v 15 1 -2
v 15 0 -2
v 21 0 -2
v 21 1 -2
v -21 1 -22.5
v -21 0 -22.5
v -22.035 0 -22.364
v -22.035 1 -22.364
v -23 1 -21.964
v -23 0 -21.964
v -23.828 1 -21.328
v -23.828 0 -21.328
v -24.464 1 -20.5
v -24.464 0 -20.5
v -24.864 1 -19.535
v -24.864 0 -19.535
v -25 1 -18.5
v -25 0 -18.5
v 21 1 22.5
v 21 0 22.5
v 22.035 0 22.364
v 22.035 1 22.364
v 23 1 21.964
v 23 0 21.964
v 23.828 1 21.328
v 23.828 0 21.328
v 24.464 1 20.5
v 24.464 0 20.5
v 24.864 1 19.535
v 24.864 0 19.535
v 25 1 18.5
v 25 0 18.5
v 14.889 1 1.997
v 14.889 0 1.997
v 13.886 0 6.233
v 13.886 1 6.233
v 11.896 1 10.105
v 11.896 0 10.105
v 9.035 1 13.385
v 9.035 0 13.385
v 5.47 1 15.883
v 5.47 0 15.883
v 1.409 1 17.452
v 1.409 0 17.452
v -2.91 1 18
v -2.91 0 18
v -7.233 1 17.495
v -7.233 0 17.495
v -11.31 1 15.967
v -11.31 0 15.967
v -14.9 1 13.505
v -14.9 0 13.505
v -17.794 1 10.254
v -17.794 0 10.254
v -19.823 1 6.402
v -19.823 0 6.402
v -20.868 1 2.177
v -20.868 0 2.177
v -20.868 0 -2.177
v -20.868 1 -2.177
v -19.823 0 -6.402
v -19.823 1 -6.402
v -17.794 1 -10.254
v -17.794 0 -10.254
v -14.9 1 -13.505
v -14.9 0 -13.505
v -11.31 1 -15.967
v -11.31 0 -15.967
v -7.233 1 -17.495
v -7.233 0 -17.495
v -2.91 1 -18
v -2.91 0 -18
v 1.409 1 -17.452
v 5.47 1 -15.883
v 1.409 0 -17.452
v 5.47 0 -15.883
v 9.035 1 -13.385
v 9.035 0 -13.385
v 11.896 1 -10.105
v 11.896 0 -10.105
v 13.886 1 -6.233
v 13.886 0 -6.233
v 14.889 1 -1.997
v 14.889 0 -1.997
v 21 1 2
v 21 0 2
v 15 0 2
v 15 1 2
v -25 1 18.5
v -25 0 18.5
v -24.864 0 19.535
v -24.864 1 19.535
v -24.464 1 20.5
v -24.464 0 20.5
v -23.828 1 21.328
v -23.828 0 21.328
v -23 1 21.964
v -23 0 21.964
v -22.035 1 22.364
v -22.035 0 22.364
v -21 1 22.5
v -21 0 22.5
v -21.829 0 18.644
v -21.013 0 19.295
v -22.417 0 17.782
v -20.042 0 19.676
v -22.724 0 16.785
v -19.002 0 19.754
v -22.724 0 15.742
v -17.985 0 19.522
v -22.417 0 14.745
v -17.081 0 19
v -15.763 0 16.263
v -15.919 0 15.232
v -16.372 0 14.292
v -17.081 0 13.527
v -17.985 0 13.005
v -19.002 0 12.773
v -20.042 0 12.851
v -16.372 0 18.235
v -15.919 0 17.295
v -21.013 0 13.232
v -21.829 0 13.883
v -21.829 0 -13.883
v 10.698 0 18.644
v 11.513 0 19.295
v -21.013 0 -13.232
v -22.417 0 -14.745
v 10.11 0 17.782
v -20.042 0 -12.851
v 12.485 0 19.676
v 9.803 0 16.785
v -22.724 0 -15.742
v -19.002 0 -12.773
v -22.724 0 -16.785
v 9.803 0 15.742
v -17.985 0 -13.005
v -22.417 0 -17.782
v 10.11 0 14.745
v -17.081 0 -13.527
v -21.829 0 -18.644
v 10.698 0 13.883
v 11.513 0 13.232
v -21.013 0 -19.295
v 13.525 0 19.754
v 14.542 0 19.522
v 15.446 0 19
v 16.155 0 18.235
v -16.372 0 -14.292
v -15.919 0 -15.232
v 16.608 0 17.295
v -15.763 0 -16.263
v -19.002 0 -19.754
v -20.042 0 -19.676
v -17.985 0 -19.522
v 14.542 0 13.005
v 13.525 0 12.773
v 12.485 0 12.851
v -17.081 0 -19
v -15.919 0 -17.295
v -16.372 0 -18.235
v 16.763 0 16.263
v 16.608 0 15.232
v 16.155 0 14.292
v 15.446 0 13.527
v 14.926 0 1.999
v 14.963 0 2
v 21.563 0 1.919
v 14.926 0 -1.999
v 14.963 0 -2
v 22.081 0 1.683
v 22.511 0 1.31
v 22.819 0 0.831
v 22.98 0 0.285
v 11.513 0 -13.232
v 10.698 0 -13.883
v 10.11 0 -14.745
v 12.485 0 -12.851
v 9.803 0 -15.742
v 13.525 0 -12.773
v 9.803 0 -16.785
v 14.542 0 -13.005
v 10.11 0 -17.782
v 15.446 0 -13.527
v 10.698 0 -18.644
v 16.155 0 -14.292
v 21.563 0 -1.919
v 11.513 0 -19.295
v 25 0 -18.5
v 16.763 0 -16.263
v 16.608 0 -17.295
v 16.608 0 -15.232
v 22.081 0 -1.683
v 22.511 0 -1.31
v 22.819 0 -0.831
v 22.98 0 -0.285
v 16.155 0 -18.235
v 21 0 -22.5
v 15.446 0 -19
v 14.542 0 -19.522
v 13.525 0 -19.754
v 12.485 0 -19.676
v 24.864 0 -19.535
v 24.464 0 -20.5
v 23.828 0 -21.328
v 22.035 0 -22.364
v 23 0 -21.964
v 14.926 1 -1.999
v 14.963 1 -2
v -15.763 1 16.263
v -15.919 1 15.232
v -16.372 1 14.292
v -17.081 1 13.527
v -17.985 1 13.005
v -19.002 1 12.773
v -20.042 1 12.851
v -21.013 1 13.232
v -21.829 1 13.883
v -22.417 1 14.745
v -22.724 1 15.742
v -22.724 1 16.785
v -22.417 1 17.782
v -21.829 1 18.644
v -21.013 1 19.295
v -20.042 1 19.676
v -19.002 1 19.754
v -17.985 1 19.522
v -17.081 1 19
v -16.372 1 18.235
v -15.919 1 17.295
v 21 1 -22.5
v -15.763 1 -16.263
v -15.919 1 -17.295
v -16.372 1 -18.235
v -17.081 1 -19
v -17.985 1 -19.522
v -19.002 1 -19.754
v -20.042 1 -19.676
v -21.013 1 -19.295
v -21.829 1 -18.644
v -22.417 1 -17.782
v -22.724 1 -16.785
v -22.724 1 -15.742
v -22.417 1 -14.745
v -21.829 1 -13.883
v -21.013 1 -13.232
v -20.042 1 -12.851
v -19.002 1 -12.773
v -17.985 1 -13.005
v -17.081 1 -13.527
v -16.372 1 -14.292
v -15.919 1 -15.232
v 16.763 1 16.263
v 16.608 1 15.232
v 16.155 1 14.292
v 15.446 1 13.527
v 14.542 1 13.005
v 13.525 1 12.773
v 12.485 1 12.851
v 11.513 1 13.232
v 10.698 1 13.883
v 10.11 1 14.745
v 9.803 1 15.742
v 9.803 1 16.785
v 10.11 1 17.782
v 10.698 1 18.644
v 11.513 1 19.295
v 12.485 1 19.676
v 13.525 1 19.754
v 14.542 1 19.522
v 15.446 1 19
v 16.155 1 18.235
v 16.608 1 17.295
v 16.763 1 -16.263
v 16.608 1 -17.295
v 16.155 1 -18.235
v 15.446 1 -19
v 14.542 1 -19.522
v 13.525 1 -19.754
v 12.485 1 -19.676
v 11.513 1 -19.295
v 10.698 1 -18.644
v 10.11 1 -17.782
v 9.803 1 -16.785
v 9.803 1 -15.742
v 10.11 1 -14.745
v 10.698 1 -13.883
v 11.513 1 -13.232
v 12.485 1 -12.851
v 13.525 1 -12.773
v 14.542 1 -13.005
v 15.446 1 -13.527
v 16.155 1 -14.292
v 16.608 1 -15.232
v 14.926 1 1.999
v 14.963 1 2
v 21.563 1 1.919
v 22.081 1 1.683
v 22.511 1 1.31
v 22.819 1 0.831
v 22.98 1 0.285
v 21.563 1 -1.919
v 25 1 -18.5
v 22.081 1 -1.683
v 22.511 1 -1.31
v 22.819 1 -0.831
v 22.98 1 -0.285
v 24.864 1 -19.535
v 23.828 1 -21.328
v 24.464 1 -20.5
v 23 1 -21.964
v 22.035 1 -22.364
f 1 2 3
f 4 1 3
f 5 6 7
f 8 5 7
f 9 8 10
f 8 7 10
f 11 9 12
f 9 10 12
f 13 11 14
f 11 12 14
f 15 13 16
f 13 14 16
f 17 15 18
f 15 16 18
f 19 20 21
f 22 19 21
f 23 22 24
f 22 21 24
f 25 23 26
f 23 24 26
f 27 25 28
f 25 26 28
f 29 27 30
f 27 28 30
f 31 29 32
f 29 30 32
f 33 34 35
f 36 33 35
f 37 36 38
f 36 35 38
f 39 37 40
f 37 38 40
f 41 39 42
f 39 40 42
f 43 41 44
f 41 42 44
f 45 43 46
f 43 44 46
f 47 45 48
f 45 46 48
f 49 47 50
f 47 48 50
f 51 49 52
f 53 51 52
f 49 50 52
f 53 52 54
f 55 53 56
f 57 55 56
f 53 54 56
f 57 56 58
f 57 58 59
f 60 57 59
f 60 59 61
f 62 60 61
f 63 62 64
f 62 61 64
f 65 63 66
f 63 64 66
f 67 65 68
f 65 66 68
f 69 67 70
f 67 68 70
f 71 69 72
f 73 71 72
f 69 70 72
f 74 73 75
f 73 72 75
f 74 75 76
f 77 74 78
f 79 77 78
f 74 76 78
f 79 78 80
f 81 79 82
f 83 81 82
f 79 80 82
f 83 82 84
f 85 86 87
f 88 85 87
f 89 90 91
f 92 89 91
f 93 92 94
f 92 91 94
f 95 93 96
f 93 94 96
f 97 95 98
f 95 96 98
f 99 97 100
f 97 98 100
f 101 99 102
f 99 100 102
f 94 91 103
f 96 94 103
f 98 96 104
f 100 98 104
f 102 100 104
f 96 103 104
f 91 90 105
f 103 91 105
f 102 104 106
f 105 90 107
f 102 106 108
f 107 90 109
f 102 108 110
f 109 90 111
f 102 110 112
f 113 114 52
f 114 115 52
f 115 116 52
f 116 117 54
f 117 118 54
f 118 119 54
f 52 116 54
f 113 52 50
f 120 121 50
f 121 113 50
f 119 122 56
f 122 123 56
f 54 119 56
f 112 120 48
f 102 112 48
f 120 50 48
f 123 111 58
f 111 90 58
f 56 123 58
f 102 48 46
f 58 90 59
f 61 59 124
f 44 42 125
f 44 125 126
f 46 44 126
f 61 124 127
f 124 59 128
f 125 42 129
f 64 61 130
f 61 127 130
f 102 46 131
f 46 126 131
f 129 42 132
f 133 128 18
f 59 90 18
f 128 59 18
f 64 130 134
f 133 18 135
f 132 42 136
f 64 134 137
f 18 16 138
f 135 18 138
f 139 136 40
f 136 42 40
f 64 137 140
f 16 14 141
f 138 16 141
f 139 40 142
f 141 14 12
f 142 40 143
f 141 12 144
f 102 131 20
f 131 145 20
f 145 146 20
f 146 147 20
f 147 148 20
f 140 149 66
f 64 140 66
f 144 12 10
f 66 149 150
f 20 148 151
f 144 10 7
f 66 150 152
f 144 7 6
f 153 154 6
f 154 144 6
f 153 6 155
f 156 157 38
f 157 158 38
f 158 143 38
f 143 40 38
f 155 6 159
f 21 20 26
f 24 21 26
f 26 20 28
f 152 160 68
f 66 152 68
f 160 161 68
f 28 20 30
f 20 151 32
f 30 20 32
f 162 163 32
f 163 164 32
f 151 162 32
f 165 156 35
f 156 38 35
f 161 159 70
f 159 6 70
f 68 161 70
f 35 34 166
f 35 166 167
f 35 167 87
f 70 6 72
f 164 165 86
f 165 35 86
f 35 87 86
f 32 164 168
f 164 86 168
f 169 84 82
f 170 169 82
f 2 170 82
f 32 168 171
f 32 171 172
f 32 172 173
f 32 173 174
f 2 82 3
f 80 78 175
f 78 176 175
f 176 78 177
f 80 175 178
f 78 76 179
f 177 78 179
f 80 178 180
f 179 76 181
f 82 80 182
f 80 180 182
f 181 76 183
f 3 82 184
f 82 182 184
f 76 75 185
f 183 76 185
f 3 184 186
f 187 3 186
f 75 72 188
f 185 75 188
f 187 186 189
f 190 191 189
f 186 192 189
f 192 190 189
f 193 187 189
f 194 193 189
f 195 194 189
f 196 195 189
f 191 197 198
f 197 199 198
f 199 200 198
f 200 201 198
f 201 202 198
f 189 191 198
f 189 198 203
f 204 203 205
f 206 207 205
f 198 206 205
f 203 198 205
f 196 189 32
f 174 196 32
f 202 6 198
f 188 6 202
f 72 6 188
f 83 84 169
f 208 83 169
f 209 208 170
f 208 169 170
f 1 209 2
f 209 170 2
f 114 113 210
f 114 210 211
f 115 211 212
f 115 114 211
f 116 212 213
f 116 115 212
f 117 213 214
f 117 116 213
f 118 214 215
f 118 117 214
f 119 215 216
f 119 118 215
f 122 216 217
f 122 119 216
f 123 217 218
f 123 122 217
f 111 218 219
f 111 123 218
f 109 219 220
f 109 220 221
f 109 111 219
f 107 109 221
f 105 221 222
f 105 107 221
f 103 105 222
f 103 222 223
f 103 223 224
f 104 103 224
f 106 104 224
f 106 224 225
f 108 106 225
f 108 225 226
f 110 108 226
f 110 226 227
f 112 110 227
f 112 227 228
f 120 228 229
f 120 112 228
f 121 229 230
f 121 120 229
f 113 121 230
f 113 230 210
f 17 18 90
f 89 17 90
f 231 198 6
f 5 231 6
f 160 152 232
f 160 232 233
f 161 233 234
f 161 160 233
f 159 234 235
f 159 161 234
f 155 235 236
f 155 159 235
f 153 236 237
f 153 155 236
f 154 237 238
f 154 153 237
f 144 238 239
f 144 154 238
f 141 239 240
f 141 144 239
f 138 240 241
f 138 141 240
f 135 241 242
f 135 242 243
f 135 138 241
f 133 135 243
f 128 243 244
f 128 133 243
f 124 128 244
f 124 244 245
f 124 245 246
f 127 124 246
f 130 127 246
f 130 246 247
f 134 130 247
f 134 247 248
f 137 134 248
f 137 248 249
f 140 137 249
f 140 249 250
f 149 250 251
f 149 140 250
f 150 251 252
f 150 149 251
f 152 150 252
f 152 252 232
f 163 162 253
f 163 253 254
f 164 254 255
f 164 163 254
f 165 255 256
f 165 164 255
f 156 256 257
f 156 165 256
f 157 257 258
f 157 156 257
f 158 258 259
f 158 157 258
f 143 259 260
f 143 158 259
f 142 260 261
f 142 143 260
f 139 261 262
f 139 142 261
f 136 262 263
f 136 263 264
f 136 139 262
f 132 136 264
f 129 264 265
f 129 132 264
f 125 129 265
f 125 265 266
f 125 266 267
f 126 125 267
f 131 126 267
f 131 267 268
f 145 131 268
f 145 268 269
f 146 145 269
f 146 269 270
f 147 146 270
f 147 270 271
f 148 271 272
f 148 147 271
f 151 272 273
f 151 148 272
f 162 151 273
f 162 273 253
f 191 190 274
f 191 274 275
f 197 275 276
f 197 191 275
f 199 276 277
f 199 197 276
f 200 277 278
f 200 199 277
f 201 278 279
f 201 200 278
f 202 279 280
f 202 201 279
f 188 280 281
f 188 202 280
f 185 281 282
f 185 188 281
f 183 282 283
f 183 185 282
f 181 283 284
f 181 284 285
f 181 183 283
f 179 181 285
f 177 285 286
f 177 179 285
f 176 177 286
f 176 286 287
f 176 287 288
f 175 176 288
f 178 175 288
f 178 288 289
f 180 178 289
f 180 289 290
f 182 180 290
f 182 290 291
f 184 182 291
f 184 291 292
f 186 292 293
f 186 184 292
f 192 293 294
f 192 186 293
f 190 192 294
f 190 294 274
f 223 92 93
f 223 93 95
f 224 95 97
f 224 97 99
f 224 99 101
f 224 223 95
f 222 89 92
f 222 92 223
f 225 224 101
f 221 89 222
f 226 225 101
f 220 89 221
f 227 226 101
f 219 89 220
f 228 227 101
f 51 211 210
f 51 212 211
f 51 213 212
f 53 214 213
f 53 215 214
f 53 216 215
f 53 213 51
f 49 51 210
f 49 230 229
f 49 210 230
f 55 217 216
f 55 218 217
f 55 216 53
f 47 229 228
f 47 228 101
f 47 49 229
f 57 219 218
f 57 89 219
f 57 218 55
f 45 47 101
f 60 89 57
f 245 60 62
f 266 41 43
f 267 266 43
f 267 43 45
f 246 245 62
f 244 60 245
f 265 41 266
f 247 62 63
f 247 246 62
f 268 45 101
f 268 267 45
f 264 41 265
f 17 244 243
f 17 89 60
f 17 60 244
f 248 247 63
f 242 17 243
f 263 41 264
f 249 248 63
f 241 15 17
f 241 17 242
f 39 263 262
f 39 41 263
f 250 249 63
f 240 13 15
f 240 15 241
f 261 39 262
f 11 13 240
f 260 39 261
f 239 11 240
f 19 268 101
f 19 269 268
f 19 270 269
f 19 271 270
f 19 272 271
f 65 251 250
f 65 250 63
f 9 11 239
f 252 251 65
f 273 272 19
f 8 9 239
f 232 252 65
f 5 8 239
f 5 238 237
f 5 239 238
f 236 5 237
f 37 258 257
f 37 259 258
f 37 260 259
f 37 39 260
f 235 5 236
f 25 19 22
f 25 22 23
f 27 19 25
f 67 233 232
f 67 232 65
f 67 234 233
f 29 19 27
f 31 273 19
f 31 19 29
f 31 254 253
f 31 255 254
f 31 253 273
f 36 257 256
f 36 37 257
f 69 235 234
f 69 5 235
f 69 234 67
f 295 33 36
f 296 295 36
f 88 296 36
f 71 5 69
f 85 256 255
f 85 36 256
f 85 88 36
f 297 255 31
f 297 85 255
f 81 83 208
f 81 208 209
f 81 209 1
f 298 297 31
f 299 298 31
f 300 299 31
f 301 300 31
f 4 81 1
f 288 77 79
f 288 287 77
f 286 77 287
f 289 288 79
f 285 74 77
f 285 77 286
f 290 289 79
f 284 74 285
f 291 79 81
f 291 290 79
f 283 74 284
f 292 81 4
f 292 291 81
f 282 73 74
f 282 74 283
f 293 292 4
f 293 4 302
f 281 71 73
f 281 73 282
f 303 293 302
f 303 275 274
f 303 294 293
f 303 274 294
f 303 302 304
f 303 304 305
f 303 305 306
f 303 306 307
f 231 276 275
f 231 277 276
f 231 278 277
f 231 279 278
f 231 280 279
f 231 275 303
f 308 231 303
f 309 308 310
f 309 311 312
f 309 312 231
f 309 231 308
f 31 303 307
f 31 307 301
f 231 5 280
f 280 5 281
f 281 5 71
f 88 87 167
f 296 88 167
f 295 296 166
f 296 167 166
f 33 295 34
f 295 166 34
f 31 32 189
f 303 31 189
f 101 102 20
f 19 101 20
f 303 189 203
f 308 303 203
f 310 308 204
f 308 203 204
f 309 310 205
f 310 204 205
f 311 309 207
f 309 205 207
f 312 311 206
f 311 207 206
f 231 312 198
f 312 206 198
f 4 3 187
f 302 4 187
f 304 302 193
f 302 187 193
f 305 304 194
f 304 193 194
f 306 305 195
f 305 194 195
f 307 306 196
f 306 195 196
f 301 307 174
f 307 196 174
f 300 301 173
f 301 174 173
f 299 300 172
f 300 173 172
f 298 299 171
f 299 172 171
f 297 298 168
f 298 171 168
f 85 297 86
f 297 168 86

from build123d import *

# Parameters (mm, degrees)
SKETCH1_R           = 3.5
BOSS_EXTRUDE1_DEPTH = 1


with BuildPart() as part:
    # Sketch1 → Boss-Extrude1 (new body)
    with BuildSketch(Plane(origin=(0, 0, 0), x_dir=(1, 0, 0), z_dir=(0, 1, 0))):
        with BuildLine():
            Line((-21, -22.5), (21, -22.5))
            ThreePointArc((21, -22.5), (23.828427125, -21.328427125), (25, -18.5))
            Line((25, -18.5), (25, 18.5))
            ThreePointArc((25, 18.5), (23.828427125, 21.328427125), (21, 22.5))
            Line((21, 22.5), (-21, 22.5))
            ThreePointArc((-21, 22.5), (-23.828427125, 21.328427125), (-25, 18.5))
            Line((-25, 18.5), (-25, -18.5))
            ThreePointArc((-25, -18.5), (-23.828427125, -21.328427125), (-21, -22.5))
        make_face()
        with Locations((-19.263455967, 16.263455967)):
            Circle(SKETCH1_R, mode=Mode.SUBTRACT)
        with Locations((13.263455967, 16.263455967)):
            Circle(SKETCH1_R, mode=Mode.SUBTRACT)
        with Locations((13.263455967, -16.263455967)):
            Circle(SKETCH1_R, mode=Mode.SUBTRACT)
        with Locations((-19.263455967, -16.263455967)):
            Circle(SKETCH1_R, mode=Mode.SUBTRACT)
        with BuildLine():
            Line((15, 2), (21, 2))
            ThreePointArc((21, 2), (23, 0), (21, -2))
            Line((21, -2), (15, -2))
            ThreePointArc((15, -2), (14.944422982, -1.99922765), (14.888888889, -1.996911195))
            ThreePointArc((14.888888889, -1.996911195), (-21, 0), (14.888888889, 1.996911195))
            ThreePointArc((14.888888889, 1.996911195), (14.944422982, 1.99922765), (15, 2))
        make_face(mode=Mode.SUBTRACT)
    extrude(amount=BOSS_EXTRUDE1_DEPTH)


solid = part.part
